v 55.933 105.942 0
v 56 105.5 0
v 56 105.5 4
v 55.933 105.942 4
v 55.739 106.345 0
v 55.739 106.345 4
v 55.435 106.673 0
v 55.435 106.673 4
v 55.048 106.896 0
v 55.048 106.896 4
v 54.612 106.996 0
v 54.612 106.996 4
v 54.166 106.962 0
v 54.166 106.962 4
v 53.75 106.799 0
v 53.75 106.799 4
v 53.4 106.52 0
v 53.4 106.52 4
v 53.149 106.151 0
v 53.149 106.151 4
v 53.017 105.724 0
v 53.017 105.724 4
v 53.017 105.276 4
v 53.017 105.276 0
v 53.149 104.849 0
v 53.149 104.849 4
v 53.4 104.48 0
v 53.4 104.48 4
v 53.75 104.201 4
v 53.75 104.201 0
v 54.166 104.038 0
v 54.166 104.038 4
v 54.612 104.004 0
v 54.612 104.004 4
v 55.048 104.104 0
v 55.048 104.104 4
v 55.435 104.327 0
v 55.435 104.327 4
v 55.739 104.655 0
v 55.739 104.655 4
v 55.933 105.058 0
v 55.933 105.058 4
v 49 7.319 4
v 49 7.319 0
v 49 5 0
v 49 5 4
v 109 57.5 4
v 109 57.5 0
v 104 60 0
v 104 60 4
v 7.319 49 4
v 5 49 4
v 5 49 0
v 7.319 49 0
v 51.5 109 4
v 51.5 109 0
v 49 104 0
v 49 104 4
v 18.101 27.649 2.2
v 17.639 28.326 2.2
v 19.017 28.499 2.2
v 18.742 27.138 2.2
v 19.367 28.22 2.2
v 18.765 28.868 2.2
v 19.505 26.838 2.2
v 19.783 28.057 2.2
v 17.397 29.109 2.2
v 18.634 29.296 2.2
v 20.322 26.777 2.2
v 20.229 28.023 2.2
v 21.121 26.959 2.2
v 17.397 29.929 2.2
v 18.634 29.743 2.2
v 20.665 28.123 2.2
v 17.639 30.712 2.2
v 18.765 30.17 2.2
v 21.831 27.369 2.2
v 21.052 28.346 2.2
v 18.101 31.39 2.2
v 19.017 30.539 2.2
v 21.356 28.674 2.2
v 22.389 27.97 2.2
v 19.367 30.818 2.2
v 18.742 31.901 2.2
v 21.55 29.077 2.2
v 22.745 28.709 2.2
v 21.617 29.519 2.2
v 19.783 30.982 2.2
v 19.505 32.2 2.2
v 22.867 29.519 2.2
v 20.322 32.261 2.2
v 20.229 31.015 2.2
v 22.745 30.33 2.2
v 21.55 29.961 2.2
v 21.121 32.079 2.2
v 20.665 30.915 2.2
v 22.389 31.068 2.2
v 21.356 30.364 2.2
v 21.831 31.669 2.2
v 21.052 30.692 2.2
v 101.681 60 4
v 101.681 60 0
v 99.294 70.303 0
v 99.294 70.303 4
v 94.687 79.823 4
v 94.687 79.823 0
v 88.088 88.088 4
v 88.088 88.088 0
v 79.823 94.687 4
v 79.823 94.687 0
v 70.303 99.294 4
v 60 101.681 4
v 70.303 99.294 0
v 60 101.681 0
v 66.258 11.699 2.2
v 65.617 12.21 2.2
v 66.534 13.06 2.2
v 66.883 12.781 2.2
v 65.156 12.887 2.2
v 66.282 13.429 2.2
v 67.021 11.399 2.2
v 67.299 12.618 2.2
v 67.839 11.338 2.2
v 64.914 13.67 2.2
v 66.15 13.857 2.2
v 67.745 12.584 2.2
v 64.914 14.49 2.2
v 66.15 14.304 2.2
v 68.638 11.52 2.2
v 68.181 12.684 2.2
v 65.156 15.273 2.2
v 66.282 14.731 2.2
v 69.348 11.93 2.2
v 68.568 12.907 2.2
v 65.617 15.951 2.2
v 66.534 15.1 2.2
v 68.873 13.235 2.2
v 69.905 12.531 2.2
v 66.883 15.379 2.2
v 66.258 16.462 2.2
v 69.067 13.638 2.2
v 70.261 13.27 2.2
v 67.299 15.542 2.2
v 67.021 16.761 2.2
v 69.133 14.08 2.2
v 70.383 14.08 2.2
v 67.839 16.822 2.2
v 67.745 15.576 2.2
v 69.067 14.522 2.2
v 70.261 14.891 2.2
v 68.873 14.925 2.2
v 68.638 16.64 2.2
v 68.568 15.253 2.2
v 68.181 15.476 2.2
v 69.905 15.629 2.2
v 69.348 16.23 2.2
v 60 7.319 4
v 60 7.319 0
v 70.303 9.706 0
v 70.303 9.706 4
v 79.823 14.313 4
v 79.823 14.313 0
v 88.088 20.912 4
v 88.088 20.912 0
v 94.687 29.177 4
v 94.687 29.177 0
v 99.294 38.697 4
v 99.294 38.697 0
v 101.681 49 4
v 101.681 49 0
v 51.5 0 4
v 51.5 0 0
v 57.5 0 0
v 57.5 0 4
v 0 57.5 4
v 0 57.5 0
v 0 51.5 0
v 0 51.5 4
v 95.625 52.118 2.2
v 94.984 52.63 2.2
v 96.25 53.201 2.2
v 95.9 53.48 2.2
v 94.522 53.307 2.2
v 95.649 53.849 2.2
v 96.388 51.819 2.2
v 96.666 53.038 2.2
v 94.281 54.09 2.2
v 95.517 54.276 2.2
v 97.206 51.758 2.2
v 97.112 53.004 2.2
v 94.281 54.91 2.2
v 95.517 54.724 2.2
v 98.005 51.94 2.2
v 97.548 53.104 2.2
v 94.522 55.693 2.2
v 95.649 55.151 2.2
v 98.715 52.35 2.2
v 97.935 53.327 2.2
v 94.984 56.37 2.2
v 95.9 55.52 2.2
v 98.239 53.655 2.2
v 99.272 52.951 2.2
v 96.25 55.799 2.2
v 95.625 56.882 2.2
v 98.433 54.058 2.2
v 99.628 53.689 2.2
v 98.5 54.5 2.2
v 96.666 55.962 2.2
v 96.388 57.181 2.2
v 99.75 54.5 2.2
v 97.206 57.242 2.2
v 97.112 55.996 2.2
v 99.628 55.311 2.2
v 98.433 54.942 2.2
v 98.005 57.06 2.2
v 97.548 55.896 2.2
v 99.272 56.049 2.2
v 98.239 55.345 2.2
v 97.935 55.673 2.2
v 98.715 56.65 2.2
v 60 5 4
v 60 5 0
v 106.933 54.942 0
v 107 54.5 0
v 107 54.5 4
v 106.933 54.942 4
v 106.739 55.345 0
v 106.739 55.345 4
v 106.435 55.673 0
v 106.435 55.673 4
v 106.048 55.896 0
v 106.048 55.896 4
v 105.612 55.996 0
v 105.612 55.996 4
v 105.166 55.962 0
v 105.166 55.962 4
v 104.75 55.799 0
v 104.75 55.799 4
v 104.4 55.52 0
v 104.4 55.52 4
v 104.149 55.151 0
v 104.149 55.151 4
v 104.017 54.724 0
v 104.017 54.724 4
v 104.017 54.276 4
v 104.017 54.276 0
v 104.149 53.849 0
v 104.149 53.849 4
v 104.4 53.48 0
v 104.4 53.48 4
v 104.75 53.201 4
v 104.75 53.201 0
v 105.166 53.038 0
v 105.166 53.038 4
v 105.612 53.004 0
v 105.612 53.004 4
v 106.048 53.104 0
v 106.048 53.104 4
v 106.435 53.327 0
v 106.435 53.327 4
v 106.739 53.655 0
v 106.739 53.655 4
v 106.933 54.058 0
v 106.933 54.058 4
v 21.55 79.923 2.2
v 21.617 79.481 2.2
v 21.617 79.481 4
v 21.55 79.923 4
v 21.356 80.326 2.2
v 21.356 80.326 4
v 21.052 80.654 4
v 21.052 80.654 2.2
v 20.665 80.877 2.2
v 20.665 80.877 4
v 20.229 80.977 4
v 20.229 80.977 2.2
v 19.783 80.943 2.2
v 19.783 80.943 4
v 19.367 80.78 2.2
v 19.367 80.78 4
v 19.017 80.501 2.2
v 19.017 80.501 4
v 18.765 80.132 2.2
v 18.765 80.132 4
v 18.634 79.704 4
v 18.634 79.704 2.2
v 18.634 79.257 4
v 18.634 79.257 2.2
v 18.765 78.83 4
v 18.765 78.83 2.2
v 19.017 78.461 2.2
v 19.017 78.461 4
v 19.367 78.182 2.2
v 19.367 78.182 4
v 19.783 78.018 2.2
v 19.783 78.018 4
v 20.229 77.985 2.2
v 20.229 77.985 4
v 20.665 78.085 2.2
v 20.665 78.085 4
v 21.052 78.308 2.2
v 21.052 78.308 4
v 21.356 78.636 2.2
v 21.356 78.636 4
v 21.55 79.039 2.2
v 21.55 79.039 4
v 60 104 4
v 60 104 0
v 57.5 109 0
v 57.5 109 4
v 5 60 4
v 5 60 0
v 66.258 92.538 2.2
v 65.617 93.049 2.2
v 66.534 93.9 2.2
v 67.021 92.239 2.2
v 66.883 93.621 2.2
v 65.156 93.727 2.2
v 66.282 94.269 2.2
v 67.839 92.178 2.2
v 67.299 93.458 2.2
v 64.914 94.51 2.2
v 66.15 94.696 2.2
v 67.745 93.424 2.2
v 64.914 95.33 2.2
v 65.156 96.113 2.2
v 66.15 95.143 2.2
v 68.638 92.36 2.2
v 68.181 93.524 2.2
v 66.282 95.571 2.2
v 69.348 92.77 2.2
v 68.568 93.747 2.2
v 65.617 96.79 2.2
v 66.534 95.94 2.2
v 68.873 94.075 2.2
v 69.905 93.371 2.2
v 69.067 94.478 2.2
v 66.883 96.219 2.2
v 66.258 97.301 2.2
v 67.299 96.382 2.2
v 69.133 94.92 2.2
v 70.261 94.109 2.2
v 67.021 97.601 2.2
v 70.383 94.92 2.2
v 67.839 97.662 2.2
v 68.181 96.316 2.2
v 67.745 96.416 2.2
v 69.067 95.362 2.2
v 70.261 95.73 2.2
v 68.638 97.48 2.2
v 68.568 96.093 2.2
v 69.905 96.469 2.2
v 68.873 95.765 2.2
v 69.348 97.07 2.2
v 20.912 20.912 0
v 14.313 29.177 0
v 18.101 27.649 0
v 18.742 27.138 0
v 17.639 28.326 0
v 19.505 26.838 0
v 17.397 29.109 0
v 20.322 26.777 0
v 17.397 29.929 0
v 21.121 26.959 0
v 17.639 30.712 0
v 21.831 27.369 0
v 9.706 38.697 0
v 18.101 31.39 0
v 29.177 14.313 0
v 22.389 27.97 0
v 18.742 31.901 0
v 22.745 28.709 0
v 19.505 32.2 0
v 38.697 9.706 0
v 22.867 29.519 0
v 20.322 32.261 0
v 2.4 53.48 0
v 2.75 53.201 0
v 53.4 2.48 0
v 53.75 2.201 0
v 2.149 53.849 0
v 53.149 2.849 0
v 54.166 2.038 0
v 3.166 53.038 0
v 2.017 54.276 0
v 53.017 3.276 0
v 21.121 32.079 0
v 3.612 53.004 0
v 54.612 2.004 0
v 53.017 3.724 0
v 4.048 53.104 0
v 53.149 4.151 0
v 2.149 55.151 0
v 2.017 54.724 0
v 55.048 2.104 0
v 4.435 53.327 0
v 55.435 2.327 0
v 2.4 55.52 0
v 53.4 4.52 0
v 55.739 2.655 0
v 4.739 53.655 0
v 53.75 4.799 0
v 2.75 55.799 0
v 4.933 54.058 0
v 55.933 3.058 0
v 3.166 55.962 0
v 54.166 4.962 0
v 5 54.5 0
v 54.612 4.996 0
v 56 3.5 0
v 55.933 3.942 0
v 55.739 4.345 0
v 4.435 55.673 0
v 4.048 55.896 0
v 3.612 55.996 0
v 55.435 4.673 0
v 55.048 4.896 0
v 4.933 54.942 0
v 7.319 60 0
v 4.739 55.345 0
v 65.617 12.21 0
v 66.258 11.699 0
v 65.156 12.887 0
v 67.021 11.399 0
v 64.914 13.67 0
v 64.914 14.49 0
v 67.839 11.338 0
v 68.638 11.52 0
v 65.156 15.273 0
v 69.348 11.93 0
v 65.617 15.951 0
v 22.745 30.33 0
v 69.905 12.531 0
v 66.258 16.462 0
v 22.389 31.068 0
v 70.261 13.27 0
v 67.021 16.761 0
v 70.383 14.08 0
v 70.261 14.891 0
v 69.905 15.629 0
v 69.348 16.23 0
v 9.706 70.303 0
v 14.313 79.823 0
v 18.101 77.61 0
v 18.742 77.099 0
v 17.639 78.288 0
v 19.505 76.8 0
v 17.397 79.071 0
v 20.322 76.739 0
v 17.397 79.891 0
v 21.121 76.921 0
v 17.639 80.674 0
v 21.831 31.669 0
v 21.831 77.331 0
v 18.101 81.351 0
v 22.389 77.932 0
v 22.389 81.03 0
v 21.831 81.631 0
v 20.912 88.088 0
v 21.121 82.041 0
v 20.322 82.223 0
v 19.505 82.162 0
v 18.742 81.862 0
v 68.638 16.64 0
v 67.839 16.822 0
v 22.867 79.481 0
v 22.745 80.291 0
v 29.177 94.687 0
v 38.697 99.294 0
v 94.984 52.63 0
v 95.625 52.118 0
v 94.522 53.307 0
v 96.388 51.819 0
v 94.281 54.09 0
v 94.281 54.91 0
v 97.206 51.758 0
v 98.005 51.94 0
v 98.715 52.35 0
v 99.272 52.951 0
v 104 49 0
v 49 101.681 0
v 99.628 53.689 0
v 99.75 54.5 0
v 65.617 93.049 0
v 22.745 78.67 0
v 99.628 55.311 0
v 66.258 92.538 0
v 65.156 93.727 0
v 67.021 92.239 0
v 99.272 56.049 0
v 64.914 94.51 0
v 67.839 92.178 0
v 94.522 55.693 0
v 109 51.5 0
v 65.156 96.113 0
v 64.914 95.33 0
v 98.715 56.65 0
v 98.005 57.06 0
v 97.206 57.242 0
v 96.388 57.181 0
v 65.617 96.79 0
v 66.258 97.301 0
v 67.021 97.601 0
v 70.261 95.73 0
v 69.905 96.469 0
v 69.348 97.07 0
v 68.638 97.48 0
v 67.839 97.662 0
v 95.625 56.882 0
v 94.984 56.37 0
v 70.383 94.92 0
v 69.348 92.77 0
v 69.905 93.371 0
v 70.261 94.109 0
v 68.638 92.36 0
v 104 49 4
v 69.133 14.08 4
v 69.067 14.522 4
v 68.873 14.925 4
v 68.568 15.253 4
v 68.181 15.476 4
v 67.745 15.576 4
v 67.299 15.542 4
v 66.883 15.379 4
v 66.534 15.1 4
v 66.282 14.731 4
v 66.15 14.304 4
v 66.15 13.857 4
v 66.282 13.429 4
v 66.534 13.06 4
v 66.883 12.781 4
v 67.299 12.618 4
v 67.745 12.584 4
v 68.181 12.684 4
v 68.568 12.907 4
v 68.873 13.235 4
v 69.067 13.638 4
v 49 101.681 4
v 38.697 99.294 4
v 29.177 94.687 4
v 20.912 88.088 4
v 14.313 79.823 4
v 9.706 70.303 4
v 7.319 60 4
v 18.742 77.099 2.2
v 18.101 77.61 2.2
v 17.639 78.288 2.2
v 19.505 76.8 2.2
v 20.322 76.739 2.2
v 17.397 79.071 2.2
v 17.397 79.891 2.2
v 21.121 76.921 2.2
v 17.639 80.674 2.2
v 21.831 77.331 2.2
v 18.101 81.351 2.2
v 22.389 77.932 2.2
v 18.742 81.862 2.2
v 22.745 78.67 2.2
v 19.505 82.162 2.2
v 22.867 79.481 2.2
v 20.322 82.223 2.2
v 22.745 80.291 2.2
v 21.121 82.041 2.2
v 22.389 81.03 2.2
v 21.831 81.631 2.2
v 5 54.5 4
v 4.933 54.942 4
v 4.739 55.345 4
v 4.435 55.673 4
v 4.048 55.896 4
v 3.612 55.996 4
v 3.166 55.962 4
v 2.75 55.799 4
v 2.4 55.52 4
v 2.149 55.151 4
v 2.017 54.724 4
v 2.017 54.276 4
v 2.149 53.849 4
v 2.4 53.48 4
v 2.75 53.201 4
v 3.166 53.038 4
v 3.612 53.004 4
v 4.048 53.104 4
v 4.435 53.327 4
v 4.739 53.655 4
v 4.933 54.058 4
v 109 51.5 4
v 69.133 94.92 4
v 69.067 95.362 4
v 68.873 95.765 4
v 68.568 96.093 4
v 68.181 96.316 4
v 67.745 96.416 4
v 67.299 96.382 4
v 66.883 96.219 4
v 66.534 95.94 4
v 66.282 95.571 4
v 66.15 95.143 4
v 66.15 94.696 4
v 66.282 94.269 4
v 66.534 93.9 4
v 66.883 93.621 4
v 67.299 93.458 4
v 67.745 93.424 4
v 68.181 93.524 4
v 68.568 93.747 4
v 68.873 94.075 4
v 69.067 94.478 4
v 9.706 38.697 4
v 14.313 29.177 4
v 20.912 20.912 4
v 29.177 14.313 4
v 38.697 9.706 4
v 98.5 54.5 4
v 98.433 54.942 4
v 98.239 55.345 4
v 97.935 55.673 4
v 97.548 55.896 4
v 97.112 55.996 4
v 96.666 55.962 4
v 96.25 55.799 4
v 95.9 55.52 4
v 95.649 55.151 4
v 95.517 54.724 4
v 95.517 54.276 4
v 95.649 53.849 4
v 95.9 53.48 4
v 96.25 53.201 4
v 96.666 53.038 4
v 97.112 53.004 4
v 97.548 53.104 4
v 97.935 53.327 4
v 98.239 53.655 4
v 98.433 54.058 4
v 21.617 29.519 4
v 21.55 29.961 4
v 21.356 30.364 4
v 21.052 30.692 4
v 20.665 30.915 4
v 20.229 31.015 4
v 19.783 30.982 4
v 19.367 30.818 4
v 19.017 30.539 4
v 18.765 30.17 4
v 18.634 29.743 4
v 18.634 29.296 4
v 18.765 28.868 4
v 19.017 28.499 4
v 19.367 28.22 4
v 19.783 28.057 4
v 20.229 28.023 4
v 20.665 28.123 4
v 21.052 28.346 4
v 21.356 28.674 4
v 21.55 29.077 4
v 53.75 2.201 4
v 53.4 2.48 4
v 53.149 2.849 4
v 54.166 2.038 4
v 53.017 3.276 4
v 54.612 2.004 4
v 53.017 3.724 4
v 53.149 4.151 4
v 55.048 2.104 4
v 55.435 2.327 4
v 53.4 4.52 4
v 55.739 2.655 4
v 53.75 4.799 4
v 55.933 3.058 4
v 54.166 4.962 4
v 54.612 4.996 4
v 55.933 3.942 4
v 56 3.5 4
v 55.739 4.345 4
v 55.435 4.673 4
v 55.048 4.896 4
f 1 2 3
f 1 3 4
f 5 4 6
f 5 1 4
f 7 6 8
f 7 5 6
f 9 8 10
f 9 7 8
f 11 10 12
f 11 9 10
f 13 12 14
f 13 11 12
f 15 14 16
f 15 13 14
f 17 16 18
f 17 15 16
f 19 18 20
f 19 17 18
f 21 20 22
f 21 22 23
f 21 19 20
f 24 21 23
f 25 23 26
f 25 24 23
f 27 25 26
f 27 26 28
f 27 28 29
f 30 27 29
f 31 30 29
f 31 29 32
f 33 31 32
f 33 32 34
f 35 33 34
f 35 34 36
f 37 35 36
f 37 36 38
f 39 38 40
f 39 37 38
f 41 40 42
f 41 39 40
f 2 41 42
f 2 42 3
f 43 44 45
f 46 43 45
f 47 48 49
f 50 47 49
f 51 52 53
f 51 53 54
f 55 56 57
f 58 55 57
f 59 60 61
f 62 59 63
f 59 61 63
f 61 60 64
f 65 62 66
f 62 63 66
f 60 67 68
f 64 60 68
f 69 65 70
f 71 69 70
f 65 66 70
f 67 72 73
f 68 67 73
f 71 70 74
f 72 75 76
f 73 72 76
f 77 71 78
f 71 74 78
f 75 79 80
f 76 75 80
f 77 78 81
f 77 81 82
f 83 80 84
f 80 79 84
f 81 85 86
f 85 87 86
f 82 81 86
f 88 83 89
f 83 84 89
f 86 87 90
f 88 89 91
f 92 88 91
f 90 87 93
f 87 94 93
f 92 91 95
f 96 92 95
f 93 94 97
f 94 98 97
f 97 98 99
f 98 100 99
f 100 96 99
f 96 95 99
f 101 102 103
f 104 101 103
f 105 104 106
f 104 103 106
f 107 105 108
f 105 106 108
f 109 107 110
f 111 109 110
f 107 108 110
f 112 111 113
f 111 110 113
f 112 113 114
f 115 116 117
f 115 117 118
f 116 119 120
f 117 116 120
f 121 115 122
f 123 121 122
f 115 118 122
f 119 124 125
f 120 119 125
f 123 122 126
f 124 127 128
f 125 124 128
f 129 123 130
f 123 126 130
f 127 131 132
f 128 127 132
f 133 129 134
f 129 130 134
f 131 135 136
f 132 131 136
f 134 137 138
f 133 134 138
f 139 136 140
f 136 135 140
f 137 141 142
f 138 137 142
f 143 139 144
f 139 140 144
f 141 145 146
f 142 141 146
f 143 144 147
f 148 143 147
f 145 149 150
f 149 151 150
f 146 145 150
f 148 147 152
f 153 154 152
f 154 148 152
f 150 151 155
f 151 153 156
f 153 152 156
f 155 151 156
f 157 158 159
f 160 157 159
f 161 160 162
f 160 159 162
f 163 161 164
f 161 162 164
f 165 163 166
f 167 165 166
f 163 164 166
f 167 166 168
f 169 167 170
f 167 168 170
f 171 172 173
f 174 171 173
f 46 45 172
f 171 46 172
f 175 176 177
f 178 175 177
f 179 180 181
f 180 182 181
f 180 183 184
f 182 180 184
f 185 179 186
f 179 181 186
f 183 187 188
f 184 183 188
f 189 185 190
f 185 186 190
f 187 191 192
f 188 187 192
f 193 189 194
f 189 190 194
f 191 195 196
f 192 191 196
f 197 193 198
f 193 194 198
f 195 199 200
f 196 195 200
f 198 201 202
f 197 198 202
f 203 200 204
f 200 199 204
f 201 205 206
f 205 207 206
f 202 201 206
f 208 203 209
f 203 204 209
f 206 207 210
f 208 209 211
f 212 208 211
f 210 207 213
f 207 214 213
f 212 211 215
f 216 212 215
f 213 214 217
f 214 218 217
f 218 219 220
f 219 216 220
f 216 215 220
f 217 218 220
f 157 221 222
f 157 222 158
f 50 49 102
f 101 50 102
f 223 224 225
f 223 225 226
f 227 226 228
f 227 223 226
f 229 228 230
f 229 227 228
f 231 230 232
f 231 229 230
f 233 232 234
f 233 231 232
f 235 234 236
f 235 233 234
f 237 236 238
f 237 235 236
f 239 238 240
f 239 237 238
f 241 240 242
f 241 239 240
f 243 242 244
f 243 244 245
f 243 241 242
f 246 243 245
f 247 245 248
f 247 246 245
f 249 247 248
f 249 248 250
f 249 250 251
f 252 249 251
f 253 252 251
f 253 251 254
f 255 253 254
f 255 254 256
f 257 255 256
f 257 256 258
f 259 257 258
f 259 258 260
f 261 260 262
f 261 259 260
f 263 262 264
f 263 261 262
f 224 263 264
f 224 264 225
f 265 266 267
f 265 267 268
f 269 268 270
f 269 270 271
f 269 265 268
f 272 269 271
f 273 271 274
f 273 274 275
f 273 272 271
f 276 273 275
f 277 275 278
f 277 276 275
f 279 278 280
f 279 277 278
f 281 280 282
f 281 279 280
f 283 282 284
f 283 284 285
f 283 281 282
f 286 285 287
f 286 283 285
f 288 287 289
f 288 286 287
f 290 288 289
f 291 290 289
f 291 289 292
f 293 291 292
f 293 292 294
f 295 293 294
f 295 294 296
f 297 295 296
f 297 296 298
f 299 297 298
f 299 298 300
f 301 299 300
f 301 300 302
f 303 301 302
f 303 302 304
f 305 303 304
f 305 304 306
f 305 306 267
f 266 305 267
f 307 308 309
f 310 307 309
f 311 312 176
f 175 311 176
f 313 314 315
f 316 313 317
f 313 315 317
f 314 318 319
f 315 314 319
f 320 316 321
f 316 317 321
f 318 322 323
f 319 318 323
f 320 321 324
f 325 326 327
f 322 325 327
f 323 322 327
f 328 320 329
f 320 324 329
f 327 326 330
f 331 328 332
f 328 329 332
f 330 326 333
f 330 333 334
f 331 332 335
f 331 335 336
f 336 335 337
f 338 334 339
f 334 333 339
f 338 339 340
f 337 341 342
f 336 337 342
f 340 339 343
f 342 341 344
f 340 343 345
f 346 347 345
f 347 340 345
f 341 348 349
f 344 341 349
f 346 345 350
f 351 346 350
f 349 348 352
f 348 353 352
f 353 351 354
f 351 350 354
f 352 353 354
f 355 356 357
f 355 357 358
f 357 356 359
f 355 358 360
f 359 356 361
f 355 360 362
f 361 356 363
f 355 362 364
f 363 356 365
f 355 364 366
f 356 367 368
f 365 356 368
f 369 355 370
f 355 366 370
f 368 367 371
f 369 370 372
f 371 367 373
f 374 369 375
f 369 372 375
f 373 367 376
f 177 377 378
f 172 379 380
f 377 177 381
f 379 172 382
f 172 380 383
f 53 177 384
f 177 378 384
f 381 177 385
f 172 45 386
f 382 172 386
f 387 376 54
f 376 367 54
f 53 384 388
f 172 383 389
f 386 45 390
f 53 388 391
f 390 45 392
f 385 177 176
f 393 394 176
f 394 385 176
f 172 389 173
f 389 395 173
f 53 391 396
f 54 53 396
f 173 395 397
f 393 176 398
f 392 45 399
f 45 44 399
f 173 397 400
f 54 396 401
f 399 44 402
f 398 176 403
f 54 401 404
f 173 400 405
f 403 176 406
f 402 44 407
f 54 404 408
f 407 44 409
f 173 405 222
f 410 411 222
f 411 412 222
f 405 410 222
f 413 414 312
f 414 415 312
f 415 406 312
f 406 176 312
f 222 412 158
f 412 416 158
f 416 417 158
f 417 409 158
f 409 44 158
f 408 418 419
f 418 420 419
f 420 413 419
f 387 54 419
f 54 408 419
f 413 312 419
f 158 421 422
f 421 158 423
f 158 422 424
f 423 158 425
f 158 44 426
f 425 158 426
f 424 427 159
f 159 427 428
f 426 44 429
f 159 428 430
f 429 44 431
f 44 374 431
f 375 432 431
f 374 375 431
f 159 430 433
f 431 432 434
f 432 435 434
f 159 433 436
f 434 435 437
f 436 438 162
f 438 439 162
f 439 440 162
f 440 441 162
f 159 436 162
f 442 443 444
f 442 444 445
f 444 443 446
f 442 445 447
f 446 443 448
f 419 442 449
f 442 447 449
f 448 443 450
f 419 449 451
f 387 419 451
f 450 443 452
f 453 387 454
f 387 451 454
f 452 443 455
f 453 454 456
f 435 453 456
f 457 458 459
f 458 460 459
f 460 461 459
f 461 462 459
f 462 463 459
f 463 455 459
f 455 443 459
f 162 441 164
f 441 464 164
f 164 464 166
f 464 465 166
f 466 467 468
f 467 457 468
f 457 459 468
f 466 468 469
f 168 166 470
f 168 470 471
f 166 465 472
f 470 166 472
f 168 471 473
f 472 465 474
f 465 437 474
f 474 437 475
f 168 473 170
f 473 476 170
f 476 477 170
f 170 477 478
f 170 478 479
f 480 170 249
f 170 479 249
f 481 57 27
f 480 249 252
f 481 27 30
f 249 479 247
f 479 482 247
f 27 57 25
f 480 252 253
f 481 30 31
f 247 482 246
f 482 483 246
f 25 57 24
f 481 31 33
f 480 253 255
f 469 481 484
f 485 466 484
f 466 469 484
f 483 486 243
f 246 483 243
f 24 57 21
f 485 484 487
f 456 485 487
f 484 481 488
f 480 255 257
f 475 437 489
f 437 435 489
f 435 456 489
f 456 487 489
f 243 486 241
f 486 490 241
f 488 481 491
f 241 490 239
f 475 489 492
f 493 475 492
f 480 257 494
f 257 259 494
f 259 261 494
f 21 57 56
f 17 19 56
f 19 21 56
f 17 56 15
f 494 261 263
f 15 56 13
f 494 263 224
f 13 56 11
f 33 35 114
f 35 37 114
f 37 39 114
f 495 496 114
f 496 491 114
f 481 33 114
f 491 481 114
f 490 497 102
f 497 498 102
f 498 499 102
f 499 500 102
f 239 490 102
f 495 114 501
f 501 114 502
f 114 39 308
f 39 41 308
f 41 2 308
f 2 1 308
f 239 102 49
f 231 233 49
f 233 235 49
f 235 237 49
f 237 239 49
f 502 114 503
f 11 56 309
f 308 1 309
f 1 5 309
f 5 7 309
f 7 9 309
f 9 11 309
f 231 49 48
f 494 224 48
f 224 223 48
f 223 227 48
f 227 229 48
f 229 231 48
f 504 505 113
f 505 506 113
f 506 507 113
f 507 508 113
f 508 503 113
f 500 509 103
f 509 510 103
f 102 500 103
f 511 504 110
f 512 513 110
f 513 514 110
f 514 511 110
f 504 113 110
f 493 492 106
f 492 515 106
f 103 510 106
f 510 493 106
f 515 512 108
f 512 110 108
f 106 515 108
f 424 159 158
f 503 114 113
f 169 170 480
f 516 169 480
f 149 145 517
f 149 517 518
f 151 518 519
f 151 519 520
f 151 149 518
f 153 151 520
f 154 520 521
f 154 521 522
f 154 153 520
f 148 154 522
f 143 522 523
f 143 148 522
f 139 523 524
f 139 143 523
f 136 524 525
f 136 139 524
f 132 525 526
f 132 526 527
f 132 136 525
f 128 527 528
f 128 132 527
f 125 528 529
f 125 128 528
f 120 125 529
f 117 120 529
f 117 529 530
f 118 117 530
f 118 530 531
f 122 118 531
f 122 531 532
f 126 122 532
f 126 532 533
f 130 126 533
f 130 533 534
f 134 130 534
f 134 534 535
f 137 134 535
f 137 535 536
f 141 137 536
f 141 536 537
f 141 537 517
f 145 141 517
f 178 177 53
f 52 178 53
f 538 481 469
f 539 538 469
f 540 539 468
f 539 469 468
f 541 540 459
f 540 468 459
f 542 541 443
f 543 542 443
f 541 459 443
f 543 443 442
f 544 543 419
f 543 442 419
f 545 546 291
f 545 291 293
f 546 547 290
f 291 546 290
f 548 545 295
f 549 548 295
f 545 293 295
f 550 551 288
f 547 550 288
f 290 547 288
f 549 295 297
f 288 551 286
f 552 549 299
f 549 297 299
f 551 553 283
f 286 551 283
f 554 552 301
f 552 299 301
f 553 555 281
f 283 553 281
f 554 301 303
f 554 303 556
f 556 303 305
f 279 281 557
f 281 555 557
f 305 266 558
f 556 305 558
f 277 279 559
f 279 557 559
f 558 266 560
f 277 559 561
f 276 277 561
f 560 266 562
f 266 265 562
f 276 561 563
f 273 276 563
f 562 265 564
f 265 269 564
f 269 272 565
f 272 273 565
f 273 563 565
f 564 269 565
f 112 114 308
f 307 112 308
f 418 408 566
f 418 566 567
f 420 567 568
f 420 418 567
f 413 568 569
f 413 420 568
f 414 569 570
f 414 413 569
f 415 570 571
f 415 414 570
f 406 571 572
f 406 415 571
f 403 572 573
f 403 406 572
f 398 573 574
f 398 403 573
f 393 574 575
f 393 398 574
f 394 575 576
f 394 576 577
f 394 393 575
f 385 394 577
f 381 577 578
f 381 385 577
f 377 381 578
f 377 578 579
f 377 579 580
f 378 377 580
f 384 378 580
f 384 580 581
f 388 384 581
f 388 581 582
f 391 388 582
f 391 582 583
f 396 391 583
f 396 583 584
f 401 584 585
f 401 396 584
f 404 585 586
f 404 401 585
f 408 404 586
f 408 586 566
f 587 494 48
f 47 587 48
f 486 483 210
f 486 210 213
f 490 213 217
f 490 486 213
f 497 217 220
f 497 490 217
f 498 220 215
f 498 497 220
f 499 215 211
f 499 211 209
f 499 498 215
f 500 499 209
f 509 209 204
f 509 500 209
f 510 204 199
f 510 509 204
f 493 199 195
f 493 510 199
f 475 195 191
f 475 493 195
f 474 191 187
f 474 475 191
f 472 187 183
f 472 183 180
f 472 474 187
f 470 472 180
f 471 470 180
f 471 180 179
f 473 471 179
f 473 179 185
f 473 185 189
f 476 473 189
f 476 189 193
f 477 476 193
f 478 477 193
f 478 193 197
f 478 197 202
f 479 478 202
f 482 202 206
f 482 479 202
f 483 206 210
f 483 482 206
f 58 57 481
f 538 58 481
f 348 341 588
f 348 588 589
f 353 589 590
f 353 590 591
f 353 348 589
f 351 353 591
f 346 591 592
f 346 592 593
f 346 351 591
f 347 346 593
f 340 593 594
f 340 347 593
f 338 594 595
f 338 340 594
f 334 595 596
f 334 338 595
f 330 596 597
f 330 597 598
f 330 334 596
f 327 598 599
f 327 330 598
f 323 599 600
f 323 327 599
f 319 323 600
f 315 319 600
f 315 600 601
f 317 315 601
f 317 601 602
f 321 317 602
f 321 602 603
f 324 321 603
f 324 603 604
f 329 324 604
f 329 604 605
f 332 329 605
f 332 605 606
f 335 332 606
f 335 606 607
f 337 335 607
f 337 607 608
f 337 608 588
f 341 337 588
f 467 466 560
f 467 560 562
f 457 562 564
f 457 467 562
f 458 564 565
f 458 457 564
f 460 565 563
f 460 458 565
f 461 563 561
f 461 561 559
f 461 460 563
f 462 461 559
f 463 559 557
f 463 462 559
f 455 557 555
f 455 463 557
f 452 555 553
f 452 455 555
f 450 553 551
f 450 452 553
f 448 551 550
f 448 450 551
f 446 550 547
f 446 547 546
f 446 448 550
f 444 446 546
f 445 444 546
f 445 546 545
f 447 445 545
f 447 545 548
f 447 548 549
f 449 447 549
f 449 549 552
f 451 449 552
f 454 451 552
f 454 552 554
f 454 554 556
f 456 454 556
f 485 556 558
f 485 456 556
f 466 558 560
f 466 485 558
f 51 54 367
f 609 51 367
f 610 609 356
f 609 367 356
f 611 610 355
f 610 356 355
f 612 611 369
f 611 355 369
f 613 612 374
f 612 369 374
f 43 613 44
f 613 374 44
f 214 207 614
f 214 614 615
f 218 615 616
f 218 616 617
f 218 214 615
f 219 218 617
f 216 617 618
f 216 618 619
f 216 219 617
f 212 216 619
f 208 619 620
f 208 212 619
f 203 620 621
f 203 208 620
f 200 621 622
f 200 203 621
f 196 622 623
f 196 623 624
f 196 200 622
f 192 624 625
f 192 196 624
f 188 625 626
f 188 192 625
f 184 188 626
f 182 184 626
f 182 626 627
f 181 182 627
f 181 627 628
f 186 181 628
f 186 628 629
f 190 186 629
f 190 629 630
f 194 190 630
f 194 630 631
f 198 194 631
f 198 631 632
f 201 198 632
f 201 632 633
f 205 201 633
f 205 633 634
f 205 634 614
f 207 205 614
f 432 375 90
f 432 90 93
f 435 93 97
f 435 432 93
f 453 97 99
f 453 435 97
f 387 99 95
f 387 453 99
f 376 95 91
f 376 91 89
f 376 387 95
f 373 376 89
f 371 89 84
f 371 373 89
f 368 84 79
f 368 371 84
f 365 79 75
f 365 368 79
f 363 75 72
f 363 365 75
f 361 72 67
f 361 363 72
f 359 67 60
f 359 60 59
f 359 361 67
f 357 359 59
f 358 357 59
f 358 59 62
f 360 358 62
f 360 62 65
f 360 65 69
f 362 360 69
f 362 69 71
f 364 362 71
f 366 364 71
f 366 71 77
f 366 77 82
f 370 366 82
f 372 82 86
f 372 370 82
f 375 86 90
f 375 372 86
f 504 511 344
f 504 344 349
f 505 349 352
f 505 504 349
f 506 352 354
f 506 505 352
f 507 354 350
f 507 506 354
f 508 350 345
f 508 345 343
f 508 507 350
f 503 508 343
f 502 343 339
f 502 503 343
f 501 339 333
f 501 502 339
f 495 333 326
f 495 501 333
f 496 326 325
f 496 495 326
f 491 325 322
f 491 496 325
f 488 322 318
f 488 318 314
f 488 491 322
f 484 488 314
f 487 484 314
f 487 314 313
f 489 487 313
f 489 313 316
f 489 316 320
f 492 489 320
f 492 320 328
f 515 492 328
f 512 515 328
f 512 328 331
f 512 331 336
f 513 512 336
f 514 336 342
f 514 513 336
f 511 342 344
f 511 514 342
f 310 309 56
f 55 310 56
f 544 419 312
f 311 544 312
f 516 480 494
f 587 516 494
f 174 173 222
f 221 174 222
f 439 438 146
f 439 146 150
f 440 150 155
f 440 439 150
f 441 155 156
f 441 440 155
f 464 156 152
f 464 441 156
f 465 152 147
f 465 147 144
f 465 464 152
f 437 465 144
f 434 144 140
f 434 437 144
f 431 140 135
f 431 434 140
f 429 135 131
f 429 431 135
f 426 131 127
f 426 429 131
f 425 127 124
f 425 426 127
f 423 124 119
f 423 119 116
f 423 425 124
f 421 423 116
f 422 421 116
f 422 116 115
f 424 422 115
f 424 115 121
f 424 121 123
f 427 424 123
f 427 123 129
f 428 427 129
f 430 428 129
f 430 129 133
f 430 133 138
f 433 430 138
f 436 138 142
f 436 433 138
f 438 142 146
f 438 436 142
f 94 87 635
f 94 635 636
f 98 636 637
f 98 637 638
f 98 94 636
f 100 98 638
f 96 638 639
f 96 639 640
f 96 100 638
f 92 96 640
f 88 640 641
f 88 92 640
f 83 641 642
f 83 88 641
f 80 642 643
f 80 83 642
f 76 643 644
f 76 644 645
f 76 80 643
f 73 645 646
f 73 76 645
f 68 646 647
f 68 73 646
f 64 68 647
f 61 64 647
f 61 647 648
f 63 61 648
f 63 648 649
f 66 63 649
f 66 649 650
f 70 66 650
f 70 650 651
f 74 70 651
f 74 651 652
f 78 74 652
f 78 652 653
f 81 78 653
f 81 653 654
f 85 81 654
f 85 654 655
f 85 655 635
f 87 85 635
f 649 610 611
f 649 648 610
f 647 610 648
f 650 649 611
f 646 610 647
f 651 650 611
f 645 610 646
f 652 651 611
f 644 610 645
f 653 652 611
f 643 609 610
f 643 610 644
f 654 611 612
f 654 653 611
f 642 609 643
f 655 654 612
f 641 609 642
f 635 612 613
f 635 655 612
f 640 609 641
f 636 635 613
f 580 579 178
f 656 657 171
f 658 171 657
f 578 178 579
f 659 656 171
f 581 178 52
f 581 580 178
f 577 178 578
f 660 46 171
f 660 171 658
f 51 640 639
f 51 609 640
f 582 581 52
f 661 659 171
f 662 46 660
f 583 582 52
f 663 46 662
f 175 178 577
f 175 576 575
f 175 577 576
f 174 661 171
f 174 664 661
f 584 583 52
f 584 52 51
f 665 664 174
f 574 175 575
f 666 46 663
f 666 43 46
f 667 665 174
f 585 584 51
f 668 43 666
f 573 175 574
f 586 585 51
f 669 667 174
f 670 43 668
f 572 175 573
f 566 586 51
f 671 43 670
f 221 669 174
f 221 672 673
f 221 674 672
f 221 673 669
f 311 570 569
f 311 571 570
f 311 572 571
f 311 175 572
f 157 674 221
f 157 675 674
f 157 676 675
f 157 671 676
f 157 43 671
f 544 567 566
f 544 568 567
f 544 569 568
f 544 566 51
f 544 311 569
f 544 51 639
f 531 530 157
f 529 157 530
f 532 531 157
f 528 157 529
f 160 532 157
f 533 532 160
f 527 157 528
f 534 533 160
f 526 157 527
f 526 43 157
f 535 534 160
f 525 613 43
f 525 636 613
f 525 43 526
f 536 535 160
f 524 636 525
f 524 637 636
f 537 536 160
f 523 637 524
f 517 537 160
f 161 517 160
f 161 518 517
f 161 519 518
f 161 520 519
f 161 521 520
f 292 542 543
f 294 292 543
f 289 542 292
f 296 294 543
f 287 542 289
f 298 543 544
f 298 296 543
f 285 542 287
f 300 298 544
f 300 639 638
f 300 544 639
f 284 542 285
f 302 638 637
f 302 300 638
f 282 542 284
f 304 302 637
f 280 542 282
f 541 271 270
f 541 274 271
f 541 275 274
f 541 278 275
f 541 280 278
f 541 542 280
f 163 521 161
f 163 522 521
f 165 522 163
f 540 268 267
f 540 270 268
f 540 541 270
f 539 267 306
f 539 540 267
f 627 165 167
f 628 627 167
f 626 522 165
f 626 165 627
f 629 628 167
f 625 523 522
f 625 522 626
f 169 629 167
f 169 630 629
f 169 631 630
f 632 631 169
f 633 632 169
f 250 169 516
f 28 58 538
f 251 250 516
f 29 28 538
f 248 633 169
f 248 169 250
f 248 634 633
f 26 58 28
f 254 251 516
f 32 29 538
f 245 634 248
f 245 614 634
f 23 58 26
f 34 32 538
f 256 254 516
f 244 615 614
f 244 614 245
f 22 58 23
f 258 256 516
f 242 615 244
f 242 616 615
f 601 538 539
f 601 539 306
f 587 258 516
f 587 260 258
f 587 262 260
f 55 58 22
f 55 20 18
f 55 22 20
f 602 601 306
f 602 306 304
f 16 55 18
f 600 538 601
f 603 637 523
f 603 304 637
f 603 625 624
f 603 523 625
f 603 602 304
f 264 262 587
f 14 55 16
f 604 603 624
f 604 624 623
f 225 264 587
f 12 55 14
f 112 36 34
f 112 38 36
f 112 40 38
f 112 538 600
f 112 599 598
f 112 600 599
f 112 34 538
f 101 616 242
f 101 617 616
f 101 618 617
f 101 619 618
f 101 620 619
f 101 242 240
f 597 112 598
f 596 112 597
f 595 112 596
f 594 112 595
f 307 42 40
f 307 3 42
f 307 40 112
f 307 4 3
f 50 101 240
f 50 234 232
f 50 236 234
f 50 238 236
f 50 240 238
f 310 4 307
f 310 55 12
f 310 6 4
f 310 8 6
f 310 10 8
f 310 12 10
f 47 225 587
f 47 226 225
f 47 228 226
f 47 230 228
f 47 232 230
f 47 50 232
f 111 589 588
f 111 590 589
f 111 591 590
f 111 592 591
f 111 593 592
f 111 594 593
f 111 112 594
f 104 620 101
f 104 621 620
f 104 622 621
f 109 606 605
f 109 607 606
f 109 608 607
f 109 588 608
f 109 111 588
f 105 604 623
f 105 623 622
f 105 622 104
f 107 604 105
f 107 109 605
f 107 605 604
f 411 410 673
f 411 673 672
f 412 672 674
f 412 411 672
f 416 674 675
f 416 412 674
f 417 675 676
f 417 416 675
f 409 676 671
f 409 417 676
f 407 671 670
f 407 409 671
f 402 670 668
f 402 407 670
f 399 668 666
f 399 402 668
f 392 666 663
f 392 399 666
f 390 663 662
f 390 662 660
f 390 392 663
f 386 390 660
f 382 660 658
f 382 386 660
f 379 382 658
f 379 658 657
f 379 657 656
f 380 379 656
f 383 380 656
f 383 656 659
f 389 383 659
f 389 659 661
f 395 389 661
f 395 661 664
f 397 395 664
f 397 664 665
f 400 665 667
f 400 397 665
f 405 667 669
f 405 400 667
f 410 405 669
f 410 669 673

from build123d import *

# Parameters (mm, degrees)
SKETCH1_R           = 1.5
BOSS_EXTRUDE2_DEPTH = 4
SKETCH1_4_R         = 2.75
SKETCH1_4_R_2       = 1.5
CUT_EXTRUDE1_DEPTH  = 2.2


with BuildPart() as part:
    # Sketch1 → Boss-Extrude2 (new body)
    with BuildSketch(Plane.XY):
        with BuildLine():
            Line((57.5, 109), (51.5, 109))
            Line((51.5, 109), (49, 104))
            Line((49, 104), (49, 101.680504448))
            ThreePointArc((49, 101.680504448), (20.912427894, 88.087572106), (7.319495552, 60))
            Line((7.319495552, 60), (5, 60))
            Line((5, 60), (0, 57.5))
            Line((0, 57.5), (0, 51.5))
            Line((0, 51.5), (5, 49))
            Line((5, 49), (7.319495552, 49))
            ThreePointArc((7.319495552, 49), (20.912427894, 20.912427894), (49, 7.319495552))
            Line((49, 7.319495552), (49, 5))
            Line((49, 5), (51.5, 0))
            Line((51.5, 0), (57.5, 0))
            Line((57.5, 0), (60, 5))
            Line((60, 5), (60, 7.319495552))
            ThreePointArc((60, 7.319495552), (88.087572106, 20.912427894), (101.680504448, 49))
            Line((101.680504448, 49), (104, 49))
            Line((104, 49), (109, 51.5))
            Line((109, 51.5), (109, 57.5))
            Line((109, 57.5), (104, 60))
            Line((104, 60), (101.680504448, 60))
            ThreePointArc((101.680504448, 60), (88.087572106, 88.087572106), (60, 101.680504448))
            Line((60, 101.680504448), (60, 104))
            Line((60, 104), (57.5, 109))
        make_face()
        with Locations((54.5, 3.5)):
            Circle(SKETCH1_R, mode=Mode.SUBTRACT)
        with Locations((3.5, 54.5)):
            Circle(SKETCH1_R, mode=Mode.SUBTRACT)
        with Locations((105.5, 54.5)):
            Circle(SKETCH1_R, mode=Mode.SUBTRACT)
        with Locations((54.5, 105.5)):
            Circle(SKETCH1_R, mode=Mode.SUBTRACT)
        with Locations((20.116777739, 29.519126778)):
            Circle(SKETCH1_R, mode=Mode.SUBTRACT)
        with Locations((67.633222261, 14.080098057)):
            Circle(SKETCH1_R, mode=Mode.SUBTRACT)
        with Locations((20.116777739, 79.480873222)):
            Circle(SKETCH1_R, mode=Mode.SUBTRACT)
        with Locations((97, 54.5)):
            Circle(SKETCH1_R, mode=Mode.SUBTRACT)
        with Locations((67.633222261, 94.919901943)):
            Circle(SKETCH1_R, mode=Mode.SUBTRACT)
    extrude(amount=BOSS_EXTRUDE2_DEPTH)

    # Sketch1<4> → Cut-Extrude1 (cut)
    # profile 1 of 5: a face of its own
    with BuildSketch(Plane.XY):
        with Locations((20.116777739, 79.480873222)):
            Circle(SKETCH1_4_R)
        with Locations((20.116777739, 79.480873222)):
            Circle(SKETCH1_4_R_2, mode=Mode.SUBTRACT)
    # profile 2 of 5: a face of its own
    with BuildSketch(Plane.XY):
        with Locations((20.116777739, 29.519126778)):
            Circle(SKETCH1_4_R)
        with Locations((20.116777739, 29.519126778)):
            Circle(SKETCH1_4_R_2, mode=Mode.SUBTRACT)
    # profile 3 of 5: a face of its own
    with BuildSketch(Plane.XY):
        with Locations((67.633222261, 94.919901943)):
            Circle(SKETCH1_4_R)
        with Locations((67.633222261, 94.919901943)):
            Circle(SKETCH1_4_R_2, mode=Mode.SUBTRACT)
    # profile 4 of 5: a face of its own
    with BuildSketch(Plane.XY):
        with Locations((97, 54.5)):
            Circle(SKETCH1_4_R)
        with Locations((97, 54.5)):
            Circle(SKETCH1_4_R_2, mode=Mode.SUBTRACT)
    # profile 5 of 5: a face of its own
    with BuildSketch(Plane.XY):
        with Locations((67.633222261, 14.080098057)):
            Circle(SKETCH1_4_R)
        with Locations((67.633222261, 14.080098057)):
            Circle(SKETCH1_4_R_2, mode=Mode.SUBTRACT)
    extrude(amount=CUT_EXTRUDE1_DEPTH, mode=Mode.SUBTRACT)


solid = part.part
